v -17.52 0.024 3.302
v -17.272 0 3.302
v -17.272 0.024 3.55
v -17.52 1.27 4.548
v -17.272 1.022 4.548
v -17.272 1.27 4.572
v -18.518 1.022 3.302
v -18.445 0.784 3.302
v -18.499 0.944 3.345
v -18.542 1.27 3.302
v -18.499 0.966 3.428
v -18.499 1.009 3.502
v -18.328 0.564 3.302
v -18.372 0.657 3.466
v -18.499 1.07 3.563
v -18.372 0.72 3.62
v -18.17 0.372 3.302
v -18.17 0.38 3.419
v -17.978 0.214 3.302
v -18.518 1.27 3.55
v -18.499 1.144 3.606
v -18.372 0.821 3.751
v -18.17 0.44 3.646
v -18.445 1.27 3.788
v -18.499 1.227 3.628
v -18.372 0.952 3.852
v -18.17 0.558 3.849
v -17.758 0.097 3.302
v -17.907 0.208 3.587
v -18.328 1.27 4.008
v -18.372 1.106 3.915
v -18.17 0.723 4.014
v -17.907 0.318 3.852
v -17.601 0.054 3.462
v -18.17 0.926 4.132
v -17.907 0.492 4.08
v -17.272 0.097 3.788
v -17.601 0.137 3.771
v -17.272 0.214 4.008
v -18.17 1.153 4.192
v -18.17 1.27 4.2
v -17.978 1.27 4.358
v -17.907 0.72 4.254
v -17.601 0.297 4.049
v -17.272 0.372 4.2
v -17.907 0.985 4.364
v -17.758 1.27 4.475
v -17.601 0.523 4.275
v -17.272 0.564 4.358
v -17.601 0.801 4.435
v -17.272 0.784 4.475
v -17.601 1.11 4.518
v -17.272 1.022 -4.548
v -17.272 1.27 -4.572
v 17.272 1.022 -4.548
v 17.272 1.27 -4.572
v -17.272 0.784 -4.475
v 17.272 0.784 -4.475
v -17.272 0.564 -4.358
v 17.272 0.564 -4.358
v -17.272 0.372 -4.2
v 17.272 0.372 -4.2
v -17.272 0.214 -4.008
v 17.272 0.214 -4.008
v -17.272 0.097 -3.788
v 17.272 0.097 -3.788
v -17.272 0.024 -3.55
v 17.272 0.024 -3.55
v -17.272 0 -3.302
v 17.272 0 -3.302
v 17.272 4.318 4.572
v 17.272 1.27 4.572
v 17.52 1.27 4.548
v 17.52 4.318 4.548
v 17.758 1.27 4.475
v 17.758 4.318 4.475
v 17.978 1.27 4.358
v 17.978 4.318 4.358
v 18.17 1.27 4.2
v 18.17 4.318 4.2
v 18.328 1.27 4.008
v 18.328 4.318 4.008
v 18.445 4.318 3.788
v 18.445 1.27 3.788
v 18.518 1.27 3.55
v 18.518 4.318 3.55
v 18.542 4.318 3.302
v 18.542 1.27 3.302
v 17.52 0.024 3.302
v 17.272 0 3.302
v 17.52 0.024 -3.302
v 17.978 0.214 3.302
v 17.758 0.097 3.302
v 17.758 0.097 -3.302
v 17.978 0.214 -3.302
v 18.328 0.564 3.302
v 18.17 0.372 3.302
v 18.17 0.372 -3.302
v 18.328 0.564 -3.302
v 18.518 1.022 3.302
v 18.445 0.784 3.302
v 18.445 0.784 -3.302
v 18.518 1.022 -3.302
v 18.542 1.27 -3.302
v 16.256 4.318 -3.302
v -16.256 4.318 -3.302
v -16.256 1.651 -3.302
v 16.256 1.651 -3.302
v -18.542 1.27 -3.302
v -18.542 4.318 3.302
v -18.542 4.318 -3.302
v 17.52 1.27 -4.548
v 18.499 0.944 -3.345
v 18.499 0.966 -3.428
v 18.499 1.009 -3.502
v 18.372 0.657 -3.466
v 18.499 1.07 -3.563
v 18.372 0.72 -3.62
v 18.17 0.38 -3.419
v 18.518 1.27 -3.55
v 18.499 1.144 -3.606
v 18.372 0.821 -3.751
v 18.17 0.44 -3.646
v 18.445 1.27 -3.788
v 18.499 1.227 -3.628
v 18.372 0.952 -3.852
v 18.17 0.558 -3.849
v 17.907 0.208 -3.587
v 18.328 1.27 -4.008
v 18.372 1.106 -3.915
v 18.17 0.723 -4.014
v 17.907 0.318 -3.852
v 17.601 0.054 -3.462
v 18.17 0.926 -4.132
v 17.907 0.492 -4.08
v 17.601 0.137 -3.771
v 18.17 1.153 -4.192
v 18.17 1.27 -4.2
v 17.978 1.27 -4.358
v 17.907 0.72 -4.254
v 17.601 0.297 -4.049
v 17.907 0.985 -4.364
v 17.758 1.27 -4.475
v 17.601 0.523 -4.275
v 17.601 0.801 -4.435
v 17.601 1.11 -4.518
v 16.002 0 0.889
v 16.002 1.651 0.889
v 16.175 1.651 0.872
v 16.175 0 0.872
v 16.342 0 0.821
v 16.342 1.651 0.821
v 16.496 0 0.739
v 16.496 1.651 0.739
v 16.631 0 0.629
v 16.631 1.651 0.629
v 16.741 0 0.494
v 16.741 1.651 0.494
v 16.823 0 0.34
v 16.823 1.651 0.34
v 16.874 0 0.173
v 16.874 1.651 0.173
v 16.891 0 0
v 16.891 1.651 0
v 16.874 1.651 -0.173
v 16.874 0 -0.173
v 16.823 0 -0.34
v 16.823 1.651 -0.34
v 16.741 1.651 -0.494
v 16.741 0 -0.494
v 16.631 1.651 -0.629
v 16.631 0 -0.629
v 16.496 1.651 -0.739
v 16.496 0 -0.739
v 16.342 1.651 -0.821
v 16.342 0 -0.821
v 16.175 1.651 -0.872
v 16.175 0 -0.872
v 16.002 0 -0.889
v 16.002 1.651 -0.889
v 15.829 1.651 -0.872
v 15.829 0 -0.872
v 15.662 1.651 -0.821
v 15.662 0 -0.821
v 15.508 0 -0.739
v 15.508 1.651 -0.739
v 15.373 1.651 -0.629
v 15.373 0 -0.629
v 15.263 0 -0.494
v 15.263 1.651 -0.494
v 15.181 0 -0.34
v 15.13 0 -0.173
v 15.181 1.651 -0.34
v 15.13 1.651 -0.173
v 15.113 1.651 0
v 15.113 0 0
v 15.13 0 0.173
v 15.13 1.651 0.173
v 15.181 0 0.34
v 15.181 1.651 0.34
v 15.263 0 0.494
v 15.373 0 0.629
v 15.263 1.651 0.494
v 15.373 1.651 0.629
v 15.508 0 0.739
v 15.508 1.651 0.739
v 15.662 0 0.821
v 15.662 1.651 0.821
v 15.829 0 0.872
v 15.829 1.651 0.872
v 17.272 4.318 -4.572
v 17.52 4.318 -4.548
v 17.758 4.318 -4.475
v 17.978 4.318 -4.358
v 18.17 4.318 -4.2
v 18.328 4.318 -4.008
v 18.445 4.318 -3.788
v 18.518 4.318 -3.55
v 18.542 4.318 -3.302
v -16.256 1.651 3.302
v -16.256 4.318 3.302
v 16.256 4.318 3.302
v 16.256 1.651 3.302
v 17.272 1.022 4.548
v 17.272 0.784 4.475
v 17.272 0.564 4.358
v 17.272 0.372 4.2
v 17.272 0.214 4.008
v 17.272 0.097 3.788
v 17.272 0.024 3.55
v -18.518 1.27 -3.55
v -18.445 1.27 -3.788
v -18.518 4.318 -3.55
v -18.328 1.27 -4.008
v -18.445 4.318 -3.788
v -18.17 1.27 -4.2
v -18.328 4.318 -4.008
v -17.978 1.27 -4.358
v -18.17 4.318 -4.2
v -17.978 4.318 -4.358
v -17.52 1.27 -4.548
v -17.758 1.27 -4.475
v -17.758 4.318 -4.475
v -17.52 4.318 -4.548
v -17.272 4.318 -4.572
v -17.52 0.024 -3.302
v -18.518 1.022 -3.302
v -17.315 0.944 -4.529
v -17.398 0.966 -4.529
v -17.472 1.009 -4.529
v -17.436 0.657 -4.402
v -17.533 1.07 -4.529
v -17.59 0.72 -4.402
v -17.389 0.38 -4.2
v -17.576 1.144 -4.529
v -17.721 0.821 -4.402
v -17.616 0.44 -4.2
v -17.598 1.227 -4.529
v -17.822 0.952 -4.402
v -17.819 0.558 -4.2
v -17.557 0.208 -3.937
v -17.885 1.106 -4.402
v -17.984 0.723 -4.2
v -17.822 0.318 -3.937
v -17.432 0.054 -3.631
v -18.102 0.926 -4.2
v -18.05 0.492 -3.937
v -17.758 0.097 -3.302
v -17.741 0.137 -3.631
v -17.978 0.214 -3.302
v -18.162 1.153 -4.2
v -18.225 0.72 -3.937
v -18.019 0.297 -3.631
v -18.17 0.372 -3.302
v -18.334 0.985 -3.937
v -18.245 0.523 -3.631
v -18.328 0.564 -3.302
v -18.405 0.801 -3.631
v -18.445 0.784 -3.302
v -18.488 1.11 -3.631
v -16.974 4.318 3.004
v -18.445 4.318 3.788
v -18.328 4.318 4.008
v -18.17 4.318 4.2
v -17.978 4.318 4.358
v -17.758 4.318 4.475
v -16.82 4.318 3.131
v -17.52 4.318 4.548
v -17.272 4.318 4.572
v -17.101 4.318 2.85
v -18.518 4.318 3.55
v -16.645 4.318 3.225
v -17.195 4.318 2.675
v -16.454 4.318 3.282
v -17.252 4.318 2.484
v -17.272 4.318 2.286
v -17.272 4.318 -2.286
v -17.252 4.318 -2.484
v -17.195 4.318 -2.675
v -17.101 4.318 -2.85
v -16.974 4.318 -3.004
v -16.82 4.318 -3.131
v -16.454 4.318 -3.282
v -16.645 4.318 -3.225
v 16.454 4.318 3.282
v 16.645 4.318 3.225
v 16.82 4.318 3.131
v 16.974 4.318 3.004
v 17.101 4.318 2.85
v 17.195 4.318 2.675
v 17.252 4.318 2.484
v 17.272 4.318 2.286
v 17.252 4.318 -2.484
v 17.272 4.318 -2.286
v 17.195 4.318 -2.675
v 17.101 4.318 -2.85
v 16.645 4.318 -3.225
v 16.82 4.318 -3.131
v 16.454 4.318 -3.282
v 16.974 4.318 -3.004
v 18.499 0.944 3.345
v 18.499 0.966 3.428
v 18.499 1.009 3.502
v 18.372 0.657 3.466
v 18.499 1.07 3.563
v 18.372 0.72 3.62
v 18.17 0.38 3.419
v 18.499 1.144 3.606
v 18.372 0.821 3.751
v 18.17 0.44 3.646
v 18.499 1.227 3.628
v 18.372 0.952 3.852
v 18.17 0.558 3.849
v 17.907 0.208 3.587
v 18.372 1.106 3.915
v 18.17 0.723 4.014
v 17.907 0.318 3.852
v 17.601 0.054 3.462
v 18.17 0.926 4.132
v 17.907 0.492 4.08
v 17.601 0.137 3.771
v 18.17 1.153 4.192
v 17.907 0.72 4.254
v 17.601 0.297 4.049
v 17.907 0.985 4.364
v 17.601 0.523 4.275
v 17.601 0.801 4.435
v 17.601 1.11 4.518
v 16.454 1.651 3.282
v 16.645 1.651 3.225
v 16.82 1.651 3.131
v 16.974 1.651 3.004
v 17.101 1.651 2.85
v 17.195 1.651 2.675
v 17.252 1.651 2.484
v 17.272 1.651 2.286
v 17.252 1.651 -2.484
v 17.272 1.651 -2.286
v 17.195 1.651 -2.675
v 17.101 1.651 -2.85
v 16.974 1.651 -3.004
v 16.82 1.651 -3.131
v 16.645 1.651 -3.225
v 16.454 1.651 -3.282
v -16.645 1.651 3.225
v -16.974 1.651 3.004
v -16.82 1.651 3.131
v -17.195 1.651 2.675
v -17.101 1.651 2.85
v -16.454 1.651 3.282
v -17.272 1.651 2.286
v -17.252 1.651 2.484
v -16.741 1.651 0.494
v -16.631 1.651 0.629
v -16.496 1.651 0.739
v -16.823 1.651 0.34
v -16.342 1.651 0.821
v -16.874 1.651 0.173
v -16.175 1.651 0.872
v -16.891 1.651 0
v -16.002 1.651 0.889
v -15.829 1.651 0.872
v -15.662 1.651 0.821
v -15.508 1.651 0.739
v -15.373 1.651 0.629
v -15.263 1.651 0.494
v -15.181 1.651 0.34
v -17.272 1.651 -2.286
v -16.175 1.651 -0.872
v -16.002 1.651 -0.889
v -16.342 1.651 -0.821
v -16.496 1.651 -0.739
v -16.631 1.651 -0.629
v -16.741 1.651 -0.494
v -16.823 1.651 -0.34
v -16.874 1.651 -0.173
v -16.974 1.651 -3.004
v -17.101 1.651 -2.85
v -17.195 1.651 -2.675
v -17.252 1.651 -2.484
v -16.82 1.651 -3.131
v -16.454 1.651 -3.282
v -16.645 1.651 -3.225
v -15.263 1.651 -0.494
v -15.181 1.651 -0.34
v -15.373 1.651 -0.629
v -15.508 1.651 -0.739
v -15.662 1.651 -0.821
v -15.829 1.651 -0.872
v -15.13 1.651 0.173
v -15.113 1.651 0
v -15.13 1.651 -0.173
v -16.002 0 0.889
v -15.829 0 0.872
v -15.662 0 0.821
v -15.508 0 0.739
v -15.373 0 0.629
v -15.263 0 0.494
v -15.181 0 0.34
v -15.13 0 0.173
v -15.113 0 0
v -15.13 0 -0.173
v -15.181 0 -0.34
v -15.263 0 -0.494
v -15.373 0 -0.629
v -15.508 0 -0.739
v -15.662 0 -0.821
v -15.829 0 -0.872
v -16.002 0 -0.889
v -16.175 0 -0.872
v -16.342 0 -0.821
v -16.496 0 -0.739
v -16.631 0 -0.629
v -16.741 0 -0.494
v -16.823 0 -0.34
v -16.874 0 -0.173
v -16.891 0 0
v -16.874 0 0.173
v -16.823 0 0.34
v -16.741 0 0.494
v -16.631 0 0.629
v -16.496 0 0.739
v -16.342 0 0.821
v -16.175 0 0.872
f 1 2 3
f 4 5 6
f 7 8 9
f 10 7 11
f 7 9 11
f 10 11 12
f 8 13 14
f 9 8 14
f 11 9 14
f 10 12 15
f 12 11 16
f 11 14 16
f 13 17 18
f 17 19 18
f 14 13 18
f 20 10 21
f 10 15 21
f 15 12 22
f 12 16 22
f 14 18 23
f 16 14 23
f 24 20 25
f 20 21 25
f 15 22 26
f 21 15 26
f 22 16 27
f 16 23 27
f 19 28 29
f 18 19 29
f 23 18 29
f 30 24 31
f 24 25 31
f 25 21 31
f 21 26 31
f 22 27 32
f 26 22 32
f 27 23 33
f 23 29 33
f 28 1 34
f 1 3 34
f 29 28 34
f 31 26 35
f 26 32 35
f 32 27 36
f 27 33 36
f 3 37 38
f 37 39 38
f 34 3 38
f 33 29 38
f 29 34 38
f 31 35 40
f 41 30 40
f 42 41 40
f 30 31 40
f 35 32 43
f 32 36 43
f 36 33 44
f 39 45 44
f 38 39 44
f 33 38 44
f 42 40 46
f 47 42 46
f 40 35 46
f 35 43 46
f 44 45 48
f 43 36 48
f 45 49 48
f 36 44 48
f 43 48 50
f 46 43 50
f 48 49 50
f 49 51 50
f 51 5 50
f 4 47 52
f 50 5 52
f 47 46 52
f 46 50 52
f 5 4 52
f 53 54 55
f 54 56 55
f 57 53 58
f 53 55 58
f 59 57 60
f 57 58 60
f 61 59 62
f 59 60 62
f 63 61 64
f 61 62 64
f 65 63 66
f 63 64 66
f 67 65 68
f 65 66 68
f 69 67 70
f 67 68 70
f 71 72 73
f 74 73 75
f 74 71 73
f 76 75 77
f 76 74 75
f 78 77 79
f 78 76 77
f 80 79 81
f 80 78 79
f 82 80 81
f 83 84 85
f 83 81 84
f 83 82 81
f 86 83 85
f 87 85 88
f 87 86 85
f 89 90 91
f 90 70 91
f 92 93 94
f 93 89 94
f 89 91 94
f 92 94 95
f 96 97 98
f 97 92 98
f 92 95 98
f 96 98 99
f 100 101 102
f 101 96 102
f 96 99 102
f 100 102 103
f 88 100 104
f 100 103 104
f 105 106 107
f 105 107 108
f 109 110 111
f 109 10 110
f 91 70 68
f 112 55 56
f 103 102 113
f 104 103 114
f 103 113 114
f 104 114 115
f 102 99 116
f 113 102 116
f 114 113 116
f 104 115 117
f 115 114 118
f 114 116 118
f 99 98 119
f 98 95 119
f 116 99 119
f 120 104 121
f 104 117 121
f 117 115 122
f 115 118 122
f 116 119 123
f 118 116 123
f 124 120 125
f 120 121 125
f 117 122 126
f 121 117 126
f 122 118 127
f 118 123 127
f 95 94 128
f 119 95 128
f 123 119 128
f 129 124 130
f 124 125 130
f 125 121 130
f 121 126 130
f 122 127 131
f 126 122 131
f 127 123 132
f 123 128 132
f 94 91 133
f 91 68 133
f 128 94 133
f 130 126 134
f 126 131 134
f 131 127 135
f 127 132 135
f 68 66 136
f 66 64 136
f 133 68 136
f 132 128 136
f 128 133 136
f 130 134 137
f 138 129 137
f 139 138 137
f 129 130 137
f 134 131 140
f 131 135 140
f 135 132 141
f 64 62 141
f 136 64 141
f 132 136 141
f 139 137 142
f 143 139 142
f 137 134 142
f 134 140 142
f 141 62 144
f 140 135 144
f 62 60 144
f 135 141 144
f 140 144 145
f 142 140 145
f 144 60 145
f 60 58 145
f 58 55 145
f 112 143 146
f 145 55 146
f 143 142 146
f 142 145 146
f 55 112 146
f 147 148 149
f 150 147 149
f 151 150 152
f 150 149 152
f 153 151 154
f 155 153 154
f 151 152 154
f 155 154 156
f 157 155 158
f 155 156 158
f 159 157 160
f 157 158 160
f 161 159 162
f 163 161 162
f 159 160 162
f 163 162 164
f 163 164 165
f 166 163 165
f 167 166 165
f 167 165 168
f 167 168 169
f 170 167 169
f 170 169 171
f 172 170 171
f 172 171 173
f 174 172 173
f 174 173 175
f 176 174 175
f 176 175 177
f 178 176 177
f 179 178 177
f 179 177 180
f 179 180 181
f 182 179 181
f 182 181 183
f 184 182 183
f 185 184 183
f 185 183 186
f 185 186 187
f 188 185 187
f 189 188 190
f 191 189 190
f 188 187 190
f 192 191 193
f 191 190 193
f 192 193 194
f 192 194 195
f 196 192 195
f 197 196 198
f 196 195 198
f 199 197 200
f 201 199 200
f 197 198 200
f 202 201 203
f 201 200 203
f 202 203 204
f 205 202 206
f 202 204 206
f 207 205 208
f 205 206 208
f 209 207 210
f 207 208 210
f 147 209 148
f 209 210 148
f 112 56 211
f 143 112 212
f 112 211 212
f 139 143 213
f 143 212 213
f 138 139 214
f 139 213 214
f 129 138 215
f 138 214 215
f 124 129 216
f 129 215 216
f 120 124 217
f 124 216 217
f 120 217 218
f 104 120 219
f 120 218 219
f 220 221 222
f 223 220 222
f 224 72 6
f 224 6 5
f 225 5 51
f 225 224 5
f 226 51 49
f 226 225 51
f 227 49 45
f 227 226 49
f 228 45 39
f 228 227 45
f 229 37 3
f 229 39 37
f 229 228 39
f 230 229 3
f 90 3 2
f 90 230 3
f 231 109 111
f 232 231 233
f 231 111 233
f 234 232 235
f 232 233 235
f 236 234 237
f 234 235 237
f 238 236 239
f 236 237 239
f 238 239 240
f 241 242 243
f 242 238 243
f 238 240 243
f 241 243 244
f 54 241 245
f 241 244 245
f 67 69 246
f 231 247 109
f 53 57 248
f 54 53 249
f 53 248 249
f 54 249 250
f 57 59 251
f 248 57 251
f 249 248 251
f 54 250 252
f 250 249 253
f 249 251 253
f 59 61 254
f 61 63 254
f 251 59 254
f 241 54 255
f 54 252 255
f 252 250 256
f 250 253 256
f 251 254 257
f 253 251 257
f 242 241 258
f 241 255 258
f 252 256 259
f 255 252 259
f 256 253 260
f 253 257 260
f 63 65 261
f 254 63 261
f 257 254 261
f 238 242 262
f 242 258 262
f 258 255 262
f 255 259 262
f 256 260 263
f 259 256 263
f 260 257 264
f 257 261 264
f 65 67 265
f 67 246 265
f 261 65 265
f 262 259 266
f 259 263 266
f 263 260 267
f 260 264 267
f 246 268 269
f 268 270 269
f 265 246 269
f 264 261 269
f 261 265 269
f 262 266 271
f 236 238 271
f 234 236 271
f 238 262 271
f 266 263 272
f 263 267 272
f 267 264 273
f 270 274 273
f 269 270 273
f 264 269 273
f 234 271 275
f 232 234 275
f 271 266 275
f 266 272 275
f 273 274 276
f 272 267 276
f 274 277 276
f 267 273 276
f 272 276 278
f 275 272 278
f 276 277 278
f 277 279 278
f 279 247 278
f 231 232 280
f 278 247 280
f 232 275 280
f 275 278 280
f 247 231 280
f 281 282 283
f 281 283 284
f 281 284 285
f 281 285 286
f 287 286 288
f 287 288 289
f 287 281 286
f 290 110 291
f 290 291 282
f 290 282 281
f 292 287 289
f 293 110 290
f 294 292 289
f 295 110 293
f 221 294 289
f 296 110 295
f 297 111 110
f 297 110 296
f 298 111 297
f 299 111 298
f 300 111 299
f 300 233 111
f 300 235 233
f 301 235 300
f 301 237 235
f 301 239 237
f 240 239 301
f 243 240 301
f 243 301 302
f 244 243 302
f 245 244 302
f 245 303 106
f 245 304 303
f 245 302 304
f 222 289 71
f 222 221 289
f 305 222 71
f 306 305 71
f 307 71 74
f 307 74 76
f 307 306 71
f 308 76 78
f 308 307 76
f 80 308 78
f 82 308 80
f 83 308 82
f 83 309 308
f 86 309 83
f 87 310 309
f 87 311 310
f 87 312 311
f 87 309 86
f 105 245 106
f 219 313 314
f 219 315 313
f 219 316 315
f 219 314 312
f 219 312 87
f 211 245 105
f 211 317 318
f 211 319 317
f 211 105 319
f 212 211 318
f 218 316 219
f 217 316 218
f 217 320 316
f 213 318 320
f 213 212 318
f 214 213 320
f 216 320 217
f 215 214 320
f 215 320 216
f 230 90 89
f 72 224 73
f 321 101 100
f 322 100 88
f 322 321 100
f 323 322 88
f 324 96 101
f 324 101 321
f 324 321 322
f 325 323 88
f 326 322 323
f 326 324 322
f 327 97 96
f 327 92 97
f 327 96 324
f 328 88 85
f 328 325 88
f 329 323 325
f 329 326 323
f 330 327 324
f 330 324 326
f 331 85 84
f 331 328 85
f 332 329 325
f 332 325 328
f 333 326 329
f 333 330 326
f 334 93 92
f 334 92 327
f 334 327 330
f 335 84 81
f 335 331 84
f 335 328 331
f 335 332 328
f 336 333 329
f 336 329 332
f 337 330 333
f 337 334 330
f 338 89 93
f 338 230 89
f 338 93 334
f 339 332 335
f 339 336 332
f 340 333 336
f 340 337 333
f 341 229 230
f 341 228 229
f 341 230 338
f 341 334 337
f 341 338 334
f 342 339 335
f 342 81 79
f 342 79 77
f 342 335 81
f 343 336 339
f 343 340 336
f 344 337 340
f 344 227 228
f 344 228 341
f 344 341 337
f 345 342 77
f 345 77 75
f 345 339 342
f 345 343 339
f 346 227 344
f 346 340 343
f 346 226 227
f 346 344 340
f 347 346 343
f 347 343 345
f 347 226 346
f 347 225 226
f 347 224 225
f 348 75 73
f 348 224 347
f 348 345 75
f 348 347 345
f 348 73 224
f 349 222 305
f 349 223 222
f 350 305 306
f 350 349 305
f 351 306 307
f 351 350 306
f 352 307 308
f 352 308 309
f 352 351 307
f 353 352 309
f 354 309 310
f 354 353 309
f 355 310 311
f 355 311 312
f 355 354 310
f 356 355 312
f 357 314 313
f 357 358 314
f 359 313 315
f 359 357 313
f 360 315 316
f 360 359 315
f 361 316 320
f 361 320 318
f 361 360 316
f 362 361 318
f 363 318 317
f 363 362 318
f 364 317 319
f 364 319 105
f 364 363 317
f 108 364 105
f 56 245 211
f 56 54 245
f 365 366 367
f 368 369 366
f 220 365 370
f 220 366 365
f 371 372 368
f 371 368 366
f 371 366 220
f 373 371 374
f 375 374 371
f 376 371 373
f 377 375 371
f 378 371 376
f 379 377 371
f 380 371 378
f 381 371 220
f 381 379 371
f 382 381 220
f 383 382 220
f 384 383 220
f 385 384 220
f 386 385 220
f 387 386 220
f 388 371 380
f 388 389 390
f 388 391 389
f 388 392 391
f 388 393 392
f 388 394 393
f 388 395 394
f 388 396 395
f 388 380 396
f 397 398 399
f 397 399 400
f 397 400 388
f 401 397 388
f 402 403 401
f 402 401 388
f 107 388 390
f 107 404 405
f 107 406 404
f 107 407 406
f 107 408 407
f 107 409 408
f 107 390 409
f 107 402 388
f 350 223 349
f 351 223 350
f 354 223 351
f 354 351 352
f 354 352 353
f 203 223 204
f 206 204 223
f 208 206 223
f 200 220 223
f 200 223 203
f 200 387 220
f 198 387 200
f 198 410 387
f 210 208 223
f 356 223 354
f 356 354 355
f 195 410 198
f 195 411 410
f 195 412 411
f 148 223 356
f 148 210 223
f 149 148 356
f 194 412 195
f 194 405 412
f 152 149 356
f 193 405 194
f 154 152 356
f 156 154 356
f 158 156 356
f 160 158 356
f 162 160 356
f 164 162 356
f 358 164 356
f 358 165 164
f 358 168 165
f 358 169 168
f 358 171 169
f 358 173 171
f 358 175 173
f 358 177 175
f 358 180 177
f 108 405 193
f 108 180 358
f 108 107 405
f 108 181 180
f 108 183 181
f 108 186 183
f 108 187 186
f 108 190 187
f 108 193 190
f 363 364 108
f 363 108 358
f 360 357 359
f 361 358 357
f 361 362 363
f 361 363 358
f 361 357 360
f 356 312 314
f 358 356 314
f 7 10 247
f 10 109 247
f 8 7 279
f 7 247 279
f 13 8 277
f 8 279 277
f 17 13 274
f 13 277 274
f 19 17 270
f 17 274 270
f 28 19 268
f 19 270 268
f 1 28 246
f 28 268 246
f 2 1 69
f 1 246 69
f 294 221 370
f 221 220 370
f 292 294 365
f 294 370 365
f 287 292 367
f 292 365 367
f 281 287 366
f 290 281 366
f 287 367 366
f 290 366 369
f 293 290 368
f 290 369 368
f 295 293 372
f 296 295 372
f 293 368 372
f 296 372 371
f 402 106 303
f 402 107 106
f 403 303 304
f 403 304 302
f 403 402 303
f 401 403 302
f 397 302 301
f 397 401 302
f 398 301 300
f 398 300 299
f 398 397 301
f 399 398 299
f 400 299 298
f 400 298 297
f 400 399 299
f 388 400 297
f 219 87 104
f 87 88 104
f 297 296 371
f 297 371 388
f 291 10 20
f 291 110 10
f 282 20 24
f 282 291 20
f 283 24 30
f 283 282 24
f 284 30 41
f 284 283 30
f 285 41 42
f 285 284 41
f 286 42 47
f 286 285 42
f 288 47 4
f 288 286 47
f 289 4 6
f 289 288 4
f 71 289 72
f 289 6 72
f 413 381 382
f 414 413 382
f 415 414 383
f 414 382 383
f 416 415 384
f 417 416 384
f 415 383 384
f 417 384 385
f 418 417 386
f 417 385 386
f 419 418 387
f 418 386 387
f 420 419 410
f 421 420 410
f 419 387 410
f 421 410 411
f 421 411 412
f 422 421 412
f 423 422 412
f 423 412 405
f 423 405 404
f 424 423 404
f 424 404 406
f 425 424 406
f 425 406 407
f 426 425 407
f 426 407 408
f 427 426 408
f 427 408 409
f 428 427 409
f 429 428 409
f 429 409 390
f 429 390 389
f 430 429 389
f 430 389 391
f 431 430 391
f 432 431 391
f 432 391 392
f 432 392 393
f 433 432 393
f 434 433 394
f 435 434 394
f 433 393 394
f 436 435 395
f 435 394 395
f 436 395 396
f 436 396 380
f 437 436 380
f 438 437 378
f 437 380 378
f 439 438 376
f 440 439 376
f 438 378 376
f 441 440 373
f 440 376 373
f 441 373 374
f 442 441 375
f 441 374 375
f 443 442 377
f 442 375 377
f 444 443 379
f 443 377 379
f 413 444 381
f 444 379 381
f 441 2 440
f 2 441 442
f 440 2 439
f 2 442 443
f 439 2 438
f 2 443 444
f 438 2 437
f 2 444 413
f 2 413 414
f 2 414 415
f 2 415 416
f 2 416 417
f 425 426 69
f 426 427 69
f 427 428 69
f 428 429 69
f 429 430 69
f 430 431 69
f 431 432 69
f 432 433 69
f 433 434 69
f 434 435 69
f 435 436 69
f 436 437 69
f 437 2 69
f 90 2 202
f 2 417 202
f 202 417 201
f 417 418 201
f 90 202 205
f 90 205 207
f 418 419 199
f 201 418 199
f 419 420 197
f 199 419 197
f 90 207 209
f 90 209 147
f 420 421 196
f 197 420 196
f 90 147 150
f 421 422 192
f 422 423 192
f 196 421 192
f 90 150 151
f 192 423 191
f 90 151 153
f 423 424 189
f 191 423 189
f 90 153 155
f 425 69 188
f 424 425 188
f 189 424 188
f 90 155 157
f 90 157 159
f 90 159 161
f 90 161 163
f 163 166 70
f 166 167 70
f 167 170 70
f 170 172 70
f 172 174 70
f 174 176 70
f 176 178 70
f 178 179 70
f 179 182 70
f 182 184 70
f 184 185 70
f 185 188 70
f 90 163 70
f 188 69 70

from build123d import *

# Parameters (mm, degrees)
SKETCH1_W           = 37.084
SKETCH1_H           = 9.144
BOSS_EXTRUDE1_DEPTH = 4.318
SKETCH2_W           = 34.544
SKETCH2_H           = 6.604
CUT_EXTRUDE3_DEPTH  = 2.667
FILLET1_R           = 1.27
FILLET2_R           = 1.016
SKETCH11_R          = 0.889
CUT_EXTRUDE4_DEPTH  = 20.282682308


with BuildPart() as part:
    # Sketch1 → Boss-Extrude1 (new body)
    with BuildSketch(Plane(origin=(0, 0, 0), x_dir=(1, 0, 0), z_dir=(0, 1, 0))):
        Rectangle(SKETCH1_W, SKETCH1_H)
    extrude(amount=BOSS_EXTRUDE1_DEPTH)

    # Sketch2 → Cut-Extrude3 (cut)
    with BuildSketch(Plane(origin=(0, 4.318, 0), x_dir=(1, 0, 0), z_dir=(0, 1, 0))):
        Rectangle(SKETCH2_W, SKETCH2_H)
    extrude(amount=-CUT_EXTRUDE3_DEPTH, mode=Mode.SUBTRACT)

    # Fillet1
    fillet1_edges = [part.edges().sort_by_distance(p)[0] for p in [
        (0, 0, 4.572),
        (-18.542, 0, 0),
        (0, 0, -4.572),
        (18.542, 0, 0),
        (18.542, 2.159, 4.572),
        (-18.542, 2.159, 4.572),
        (-18.542, 2.159, -4.572),
        (18.542, 2.159, -4.572),
    ]]
    fillet(fillet1_edges, radius=FILLET1_R)

    # Fillet2
    fillet2_edges = [part.edges().sort_by_distance(p)[0] for p in [
        (-17.272, 2.9845, -3.302),
        (-17.272, 2.9845, 3.302),
        (17.272, 2.9845, 3.302),
        (17.272, 2.9845, -3.302),
    ]]
    fillet(fillet2_edges, radius=FILLET2_R)

    # Sketch11 → Cut-Extrude4 (cut, through all)
    with BuildSketch(Plane(origin=(0, 1.651, 0), x_dir=(1, 0, 0), z_dir=(0, 1, 0))):
        with Locations(Location((-16.002, 0, 0), (0, 0, 270))):
            Circle(SKETCH11_R)
        with Locations(Location((16.002, 0, 0), (0, 0, 270))):
            Circle(SKETCH11_R)
    extrude(amount=-CUT_EXTRUDE4_DEPTH, mode=Mode.SUBTRACT)


solid = part.part
